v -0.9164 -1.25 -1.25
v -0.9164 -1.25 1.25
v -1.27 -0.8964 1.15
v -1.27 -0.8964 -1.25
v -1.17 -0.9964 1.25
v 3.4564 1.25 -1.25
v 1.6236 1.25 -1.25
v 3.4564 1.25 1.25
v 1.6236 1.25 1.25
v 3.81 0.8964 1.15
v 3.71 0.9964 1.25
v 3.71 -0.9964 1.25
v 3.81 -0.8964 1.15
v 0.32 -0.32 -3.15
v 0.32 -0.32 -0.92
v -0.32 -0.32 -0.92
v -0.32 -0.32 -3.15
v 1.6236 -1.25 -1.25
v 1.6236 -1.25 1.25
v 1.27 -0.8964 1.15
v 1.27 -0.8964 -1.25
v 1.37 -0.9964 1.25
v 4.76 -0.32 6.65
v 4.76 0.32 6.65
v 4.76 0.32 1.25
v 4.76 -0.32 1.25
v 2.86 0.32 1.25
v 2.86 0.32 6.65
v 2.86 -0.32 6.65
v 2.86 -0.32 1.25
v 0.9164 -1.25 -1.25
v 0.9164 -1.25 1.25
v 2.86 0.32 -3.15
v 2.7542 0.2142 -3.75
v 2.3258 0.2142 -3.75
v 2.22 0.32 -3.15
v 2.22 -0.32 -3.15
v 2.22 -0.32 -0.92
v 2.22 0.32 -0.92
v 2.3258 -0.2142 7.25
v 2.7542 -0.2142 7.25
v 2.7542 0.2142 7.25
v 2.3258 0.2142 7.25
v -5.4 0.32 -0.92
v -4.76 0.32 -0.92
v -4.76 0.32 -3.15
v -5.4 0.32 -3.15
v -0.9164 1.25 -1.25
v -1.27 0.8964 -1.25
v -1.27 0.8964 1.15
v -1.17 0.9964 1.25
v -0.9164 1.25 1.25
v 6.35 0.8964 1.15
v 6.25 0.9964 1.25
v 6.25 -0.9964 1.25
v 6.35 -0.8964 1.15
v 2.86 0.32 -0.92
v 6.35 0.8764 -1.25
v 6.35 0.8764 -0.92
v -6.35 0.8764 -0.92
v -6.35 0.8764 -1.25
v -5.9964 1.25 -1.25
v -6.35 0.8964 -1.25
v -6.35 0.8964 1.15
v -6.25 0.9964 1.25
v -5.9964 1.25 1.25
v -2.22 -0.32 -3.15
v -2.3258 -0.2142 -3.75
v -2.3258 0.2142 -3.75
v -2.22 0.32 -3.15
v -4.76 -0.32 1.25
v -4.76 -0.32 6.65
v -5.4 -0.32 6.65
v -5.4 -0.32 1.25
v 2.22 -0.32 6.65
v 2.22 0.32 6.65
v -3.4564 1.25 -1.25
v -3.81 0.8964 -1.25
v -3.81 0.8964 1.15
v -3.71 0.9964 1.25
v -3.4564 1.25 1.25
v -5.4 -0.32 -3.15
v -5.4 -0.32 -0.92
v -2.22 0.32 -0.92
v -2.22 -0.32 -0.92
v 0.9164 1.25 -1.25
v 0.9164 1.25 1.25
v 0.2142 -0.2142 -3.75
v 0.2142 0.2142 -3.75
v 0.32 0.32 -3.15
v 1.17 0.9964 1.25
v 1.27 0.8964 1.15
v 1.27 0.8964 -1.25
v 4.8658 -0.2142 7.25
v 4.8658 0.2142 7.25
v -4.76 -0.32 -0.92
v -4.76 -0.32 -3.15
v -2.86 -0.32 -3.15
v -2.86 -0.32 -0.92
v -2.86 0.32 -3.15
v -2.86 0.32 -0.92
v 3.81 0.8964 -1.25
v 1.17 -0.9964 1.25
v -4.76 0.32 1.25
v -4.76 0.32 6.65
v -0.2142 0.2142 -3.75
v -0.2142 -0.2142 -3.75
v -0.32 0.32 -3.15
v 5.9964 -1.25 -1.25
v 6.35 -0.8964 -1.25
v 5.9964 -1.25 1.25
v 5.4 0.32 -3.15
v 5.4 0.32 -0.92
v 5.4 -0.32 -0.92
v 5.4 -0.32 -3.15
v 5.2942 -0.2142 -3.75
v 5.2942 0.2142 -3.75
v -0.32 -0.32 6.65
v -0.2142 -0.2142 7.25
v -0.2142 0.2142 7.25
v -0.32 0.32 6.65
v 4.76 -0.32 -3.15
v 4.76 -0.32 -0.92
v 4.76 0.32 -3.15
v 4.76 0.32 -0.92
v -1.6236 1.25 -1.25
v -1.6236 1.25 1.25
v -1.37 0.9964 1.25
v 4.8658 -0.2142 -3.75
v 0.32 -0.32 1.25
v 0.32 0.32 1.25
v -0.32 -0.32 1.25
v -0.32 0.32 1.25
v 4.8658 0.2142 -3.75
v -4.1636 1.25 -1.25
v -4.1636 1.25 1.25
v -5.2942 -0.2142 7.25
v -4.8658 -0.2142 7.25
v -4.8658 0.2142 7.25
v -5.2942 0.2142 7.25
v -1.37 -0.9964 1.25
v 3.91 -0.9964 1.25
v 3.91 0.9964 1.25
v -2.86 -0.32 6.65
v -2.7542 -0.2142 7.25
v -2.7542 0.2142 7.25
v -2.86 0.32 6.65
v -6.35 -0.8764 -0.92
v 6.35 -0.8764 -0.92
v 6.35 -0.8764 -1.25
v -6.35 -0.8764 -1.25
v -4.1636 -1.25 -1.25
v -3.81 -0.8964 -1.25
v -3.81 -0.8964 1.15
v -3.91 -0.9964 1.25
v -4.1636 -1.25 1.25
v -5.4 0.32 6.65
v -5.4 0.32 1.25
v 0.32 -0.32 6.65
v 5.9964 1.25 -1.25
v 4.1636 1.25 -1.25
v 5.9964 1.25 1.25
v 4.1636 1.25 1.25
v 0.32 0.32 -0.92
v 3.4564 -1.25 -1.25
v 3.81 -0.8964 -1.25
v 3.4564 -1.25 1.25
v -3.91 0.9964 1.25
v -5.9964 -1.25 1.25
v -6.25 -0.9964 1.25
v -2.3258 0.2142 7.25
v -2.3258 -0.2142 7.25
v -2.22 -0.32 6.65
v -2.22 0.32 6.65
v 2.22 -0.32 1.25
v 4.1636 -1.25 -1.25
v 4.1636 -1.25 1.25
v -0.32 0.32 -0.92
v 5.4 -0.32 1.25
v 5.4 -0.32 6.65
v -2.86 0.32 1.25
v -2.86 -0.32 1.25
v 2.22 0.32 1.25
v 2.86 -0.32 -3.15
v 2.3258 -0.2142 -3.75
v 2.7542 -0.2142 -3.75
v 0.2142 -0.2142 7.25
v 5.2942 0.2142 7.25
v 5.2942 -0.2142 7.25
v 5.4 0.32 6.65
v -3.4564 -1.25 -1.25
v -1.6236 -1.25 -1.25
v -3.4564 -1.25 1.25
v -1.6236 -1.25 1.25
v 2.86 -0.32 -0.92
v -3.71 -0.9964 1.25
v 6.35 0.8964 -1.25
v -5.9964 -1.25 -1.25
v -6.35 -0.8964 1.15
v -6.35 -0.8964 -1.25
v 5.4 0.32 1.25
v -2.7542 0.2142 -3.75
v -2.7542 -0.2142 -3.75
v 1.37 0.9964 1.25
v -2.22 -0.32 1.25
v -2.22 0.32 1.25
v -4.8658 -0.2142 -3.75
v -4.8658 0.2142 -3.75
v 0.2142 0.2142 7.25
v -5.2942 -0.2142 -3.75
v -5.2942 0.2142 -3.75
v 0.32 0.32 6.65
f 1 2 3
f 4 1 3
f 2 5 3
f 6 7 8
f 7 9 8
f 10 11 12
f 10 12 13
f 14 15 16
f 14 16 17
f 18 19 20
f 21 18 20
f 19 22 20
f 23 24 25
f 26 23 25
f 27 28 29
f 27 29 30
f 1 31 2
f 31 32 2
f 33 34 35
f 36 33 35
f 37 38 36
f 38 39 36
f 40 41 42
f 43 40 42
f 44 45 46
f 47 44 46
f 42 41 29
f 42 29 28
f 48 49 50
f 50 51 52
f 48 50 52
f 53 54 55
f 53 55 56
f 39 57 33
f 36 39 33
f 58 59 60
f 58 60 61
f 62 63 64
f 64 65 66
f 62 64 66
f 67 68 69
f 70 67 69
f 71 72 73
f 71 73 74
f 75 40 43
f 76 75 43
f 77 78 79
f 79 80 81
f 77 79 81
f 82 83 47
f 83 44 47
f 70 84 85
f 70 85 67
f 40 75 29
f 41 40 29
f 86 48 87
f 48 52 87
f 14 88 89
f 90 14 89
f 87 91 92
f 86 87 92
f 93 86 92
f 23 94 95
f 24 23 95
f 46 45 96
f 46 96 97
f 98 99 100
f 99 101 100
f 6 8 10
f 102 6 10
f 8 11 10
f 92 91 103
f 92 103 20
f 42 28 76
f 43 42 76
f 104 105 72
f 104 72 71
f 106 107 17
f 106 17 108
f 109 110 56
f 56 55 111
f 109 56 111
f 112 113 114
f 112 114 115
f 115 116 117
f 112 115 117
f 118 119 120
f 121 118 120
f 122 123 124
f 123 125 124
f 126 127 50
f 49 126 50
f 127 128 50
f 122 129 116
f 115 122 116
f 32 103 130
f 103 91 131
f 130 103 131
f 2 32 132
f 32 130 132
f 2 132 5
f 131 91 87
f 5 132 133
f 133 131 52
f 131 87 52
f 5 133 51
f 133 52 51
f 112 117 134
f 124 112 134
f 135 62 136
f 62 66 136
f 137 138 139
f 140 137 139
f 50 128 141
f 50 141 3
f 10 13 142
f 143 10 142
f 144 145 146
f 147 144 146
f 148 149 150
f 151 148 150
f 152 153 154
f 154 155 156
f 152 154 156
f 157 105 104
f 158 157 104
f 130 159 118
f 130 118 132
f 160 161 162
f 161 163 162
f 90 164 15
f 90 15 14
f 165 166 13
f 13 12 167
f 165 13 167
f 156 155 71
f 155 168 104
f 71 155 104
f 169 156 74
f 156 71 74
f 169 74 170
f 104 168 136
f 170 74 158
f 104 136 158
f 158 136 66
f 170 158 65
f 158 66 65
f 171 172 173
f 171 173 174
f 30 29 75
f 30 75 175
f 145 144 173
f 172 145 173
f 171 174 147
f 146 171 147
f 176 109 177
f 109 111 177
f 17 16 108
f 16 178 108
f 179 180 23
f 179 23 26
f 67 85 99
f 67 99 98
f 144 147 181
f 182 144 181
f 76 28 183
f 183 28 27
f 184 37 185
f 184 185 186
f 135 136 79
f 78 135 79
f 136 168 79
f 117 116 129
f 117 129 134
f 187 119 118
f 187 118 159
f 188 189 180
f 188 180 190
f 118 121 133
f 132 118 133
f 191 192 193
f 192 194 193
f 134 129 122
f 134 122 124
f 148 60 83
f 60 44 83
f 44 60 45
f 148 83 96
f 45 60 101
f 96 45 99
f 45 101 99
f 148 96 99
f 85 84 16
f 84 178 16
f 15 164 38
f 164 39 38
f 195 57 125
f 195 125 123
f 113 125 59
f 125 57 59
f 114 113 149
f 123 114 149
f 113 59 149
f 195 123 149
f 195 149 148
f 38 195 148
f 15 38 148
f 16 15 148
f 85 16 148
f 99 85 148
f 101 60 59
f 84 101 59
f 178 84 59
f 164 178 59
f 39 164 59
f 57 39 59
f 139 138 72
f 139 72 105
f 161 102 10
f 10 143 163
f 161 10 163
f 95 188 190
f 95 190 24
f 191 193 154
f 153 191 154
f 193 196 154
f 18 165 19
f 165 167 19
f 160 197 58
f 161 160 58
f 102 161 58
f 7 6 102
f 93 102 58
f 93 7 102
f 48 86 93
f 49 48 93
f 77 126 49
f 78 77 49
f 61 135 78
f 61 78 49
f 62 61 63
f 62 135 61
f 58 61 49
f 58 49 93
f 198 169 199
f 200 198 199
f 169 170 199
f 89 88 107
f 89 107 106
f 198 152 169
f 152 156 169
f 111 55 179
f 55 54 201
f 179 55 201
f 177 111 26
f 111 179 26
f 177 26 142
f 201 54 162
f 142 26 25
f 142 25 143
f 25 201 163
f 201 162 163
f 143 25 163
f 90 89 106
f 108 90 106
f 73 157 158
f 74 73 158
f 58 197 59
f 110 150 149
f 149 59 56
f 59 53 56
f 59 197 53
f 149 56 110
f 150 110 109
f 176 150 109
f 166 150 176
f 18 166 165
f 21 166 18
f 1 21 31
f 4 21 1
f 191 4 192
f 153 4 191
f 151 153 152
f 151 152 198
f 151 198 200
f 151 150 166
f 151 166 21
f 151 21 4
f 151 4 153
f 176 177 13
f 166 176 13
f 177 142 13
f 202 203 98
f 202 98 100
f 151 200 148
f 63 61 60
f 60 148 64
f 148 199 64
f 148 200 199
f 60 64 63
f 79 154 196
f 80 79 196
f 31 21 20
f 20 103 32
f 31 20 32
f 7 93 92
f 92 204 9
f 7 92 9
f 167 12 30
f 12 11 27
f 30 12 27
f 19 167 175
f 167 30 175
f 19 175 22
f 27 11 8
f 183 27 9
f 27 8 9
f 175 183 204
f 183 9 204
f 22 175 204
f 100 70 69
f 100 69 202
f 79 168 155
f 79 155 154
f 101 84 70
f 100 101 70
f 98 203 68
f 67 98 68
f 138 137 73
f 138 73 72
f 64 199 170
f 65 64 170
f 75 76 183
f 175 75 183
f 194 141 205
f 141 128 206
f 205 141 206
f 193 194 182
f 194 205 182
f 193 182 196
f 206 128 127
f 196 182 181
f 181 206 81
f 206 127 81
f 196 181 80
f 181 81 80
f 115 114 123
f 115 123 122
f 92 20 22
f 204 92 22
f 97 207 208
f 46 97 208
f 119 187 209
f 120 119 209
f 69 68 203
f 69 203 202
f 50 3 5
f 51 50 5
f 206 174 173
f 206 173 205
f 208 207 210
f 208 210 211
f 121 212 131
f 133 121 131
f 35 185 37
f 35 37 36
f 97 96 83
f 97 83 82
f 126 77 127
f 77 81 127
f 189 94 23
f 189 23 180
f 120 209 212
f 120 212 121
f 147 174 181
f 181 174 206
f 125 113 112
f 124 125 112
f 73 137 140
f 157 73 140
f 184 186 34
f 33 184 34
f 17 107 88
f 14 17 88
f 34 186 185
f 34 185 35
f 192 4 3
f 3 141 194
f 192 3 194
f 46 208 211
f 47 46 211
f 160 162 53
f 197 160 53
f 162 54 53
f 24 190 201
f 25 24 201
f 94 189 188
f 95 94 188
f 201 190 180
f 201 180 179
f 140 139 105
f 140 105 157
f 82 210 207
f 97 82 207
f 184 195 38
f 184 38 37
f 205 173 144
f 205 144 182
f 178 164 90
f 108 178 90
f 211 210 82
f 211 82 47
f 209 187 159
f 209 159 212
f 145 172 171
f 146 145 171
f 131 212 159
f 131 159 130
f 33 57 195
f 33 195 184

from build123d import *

# Parameters (mm, degrees)
EXTRUDE1_DEPTH          = 1.25
CUT_EXTRUDE3_DEPTH      = 2.25
LPATTERN4_COUNT         = 3
LPATTERN4_PITCH         = 2.54
LPATTERN4_COUNT_DIR2    = 3
LPATTERN4_PITCH_DIR2    = 2.54
SKETCH2_W               = 1.752893218
SKETCH2_H               = 0.33
CUT_EXTRUDE1_DEPTH      = 7.35
CUT_EXTRUDE1_DEPTH_BACK = 7.35
SKETCH3_W               = 11
SKETCH3_H               = 0.64
EXTRUDE_THIN1_DEPTH     = 0.32
LPATTERN5_COUNT         = 3
LPATTERN5_PITCH         = 2.54
LPATTERN5_COL_COUNT     = 3
LPATTERN5_COL_PITCH     = 2.54
CHAMFER2_SIZE           = 0.6
CHAMFER2_SIZE2          = 0.105796188
CHAMFER2_PART_2_SIZE    = 0.6
CHAMFER2_PART_2_SIZE2   = 0.105796188
CHAMFER2_PART_3_SIZE    = 0.6
CHAMFER2_PART_3_SIZE2   = 0.105796188
CHAMFER2_PART_4_SIZE    = 0.6
CHAMFER2_PART_4_SIZE2   = 0.105796188
CHAMFER2_PART_5_SIZE    = 0.6
CHAMFER2_PART_5_SIZE2   = 0.105796188
CHAMFER2_PART_6_SIZE    = 0.6
CHAMFER2_PART_6_SIZE2   = 0.105796188
CHAMFER2_PART_7_SIZE    = 0.6
CHAMFER2_PART_7_SIZE2   = 0.105796188
CHAMFER2_PART_8_SIZE    = 0.6
CHAMFER2_PART_8_SIZE2   = 0.105796188
CHAMFER2_PART_9_SIZE    = 0.6
CHAMFER2_PART_9_SIZE2   = 0.105796188
CHAMFER2_PART_10_SIZE   = 0.6
CHAMFER2_PART_10_SIZE2  = 0.105796188
CHAMFER2_PART_11_SIZE   = 0.6
CHAMFER2_PART_11_SIZE2  = 0.105796188
CHAMFER2_PART_12_SIZE   = 0.6
CHAMFER2_PART_12_SIZE2  = 0.105796188
CHAMFER2_PART_13_SIZE   = 0.6
CHAMFER2_PART_13_SIZE2  = 0.105796188
CHAMFER2_PART_14_SIZE   = 0.6
CHAMFER2_PART_14_SIZE2  = 0.105796188
CHAMFER2_PART_15_SIZE   = 0.6
CHAMFER2_PART_15_SIZE2  = 0.105796188
CHAMFER2_PART_16_SIZE   = 0.6
CHAMFER2_PART_16_SIZE2  = 0.105796188
CHAMFER2_PART_17_SIZE   = 0.6
CHAMFER2_PART_17_SIZE2  = 0.105796188
CHAMFER2_PART_18_SIZE   = 0.6
CHAMFER2_PART_18_SIZE2  = 0.105796188
CHAMFER2_PART_19_SIZE   = 0.6
CHAMFER2_PART_19_SIZE2  = 0.105796188
CHAMFER2_PART_20_SIZE   = 0.6
CHAMFER2_PART_20_SIZE2  = 0.105796188
CHAMFER2_PART_21_SIZE   = 0.6
CHAMFER2_PART_21_SIZE2  = 0.105796188
CHAMFER2_PART_22_SIZE   = 0.6
CHAMFER2_PART_22_SIZE2  = 0.105796188
CHAMFER2_PART_23_SIZE   = 0.6
CHAMFER2_PART_23_SIZE2  = 0.105796188
CHAMFER2_PART_24_SIZE   = 0.6
CHAMFER2_PART_24_SIZE2  = 0.105796188
CHAMFER2_PART_25_SIZE   = 0.6
CHAMFER2_PART_25_SIZE2  = 0.105796188
CHAMFER2_PART_26_SIZE   = 0.6
CHAMFER2_PART_26_SIZE2  = 0.105796188
CHAMFER2_PART_27_SIZE   = 0.6
CHAMFER2_PART_27_SIZE2  = 0.105796188
CHAMFER2_PART_28_SIZE   = 0.6
CHAMFER2_PART_28_SIZE2  = 0.105796188
CHAMFER2_PART_29_SIZE   = 0.6
CHAMFER2_PART_29_SIZE2  = 0.105796188
CHAMFER2_PART_30_SIZE   = 0.6
CHAMFER2_PART_30_SIZE2  = 0.105796188
CHAMFER2_PART_31_SIZE   = 0.6
CHAMFER2_PART_31_SIZE2  = 0.105796188
CHAMFER2_PART_32_SIZE   = 0.6
CHAMFER2_PART_32_SIZE2  = 0.105796188
CHAMFER2_PART_33_SIZE   = 0.6
CHAMFER2_PART_33_SIZE2  = 0.105796188
CHAMFER2_PART_34_SIZE   = 0.6
CHAMFER2_PART_34_SIZE2  = 0.105796188
CHAMFER2_PART_35_SIZE   = 0.6
CHAMFER2_PART_35_SIZE2  = 0.105796188
CHAMFER2_PART_36_SIZE   = 0.6
CHAMFER2_PART_36_SIZE2  = 0.105796188
CHAMFER2_PART_37_SIZE   = 0.6
CHAMFER2_PART_37_SIZE2  = 0.105796188
CHAMFER2_PART_38_SIZE   = 0.6
CHAMFER2_PART_38_SIZE2  = 0.105796188
CHAMFER2_PART_39_SIZE   = 0.6
CHAMFER2_PART_39_SIZE2  = 0.105796188
CHAMFER2_PART_40_SIZE   = 0.6
CHAMFER2_PART_40_SIZE2  = 0.105796188


with BuildPart() as part:
    # Sketch1 → Extrude1 (new body, symmetric)
    with BuildSketch(Plane.XY):
        Polygon((-1.27, 0.896446609), (-0.916446609, 1.25), (0.916446609, 1.25), (1.27, 0.896446609), (1.27, -0.896446609), (0.916446609, -1.25), (-0.916446609, -1.25), (-1.27, -0.896446609), align=None)
    extrude1 = extrude(amount=EXTRUDE1_DEPTH, both=True)

    # Sketch4 → Cut-Extrude3 (cut, symmetric)
    with BuildSketch(Plane(origin=(0, 0, 0), x_dir=(1, 0, 0), z_dir=(0, 1, 0))):
        Polygon((-1.27, -1.15), (-1.17, -1.25), (-1.27, -1.25), align=None)
        Polygon((1.17, -1.25), (1.27, -1.15), (1.27, -1.25), align=None)
    cut_extrude3 = extrude(amount=CUT_EXTRUDE3_DEPTH, both=True, mode=Mode.SUBTRACT)

    # LPattern4: Extrude1, Cut-Extrude3 3 × 3
    with Locations(*[Vector(-1, 0, 0) * (i * LPATTERN4_PITCH) + Vector(1, 0, 0) * (j * LPATTERN4_PITCH_DIR2) for i in range(LPATTERN4_COUNT) for j in range(LPATTERN4_COUNT_DIR2) if (i, j) != (0, 0)]):
        add(extrude1)
        add(cut_extrude3, mode=Mode.SUBTRACT)

    # Sketch2 → Cut-Extrude1 (cut, two sides)
    with BuildSketch(Plane(origin=(0, 0, 0), x_dir=(0, -1, 0), z_dir=(1, 0, 0))) as cut_extrude1_sk:
        with Locations((0, 1.085)):
            Rectangle(SKETCH2_W, SKETCH2_H)
    extrude(amount=CUT_EXTRUDE1_DEPTH, mode=Mode.SUBTRACT)
    extrude(cut_extrude1_sk.sketch, amount=-CUT_EXTRUDE1_DEPTH_BACK, mode=Mode.SUBTRACT)

    # Sketch3 → Extrude-Thin1 (add, symmetric)
    with BuildSketch(Plane(origin=(0, 0, 0), x_dir=(0, 0, -1), z_dir=(1, 0, 0))):
        with Locations((-1.75, 0)):
            Rectangle(SKETCH3_W, SKETCH3_H)
    extrude_thin1 = extrude(amount=EXTRUDE_THIN1_DEPTH, both=True)

    # LPattern5: Extrude-Thin1 ×3
    with Locations(*[(i * LPATTERN5_PITCH, 0, 0) for i in range(1, LPATTERN5_COUNT)]):
        add(extrude_thin1)

    # LPattern5 col: Extrude-Thin1 ×3
    with Locations(*[(-i * LPATTERN5_COL_PITCH, 0, 0) for i in range(1, LPATTERN5_COL_COUNT)]):
        add(extrude_thin1)

    # Chamfer2
    chamfer2_edges = [part.edges().sort_by_distance(p)[0] for p in [
        (0, -0.32, 7.25),
    ]]
    chamfer2_side = [part.faces().sort_by_distance(p)[0] for p in [
        (0, -0.32, 4.25),
    ]]
    chamfer(chamfer2_edges, length=CHAMFER2_SIZE, length2=CHAMFER2_SIZE2, reference=chamfer2_side[0])

    # Chamfer2 part 2
    chamfer2_part_2_edges = [part.edges().sort_by_distance(p)[0] for p in [
        (0, 0.32, -3.75),
    ]]
    chamfer2_part_2_side = [part.faces().sort_by_distance(p)[0] for p in [
        (0, 0.32, -2.335),
    ]]
    chamfer(chamfer2_part_2_edges, length=CHAMFER2_PART_2_SIZE, length2=CHAMFER2_PART_2_SIZE2, reference=chamfer2_part_2_side[0])

    # Chamfer2 part 3
    chamfer2_part_3_edges = [part.edges().sort_by_distance(p)[0] for p in [
        (-0.32, 0, 7.25),
    ]]
    chamfer2_part_3_side = [part.faces().sort_by_distance(p)[0] for p in [
        (-0.32, 0, 4.25),
    ]]
    chamfer(chamfer2_part_3_edges, length=CHAMFER2_PART_3_SIZE, length2=CHAMFER2_PART_3_SIZE2, reference=chamfer2_part_3_side[0])

    # Chamfer2 part 4
    chamfer2_part_4_edges = [part.edges().sort_by_distance(p)[0] for p in [
        (-0.32, 0, -3.75),
    ]]
    chamfer2_part_4_side = [part.faces().sort_by_distance(p)[0] for p in [
        (-0.32, 0, -2.335),
    ]]
    chamfer(chamfer2_part_4_edges, length=CHAMFER2_PART_4_SIZE, length2=CHAMFER2_PART_4_SIZE2, reference=chamfer2_part_4_side[0])

    # Chamfer2 part 5
    chamfer2_part_5_edges = [part.edges().sort_by_distance(p)[0] for p in [
        (0, -0.32, -3.75),
    ]]
    chamfer2_part_5_side = [part.faces().sort_by_distance(p)[0] for p in [
        (0, -0.32, -2.335),
    ]]
    chamfer(chamfer2_part_5_edges, length=CHAMFER2_PART_5_SIZE, length2=CHAMFER2_PART_5_SIZE2, reference=chamfer2_part_5_side[0])

    # Chamfer2 part 6
    chamfer2_part_6_edges = [part.edges().sort_by_distance(p)[0] for p in [
        (0.32, 0, -3.75),
    ]]
    chamfer2_part_6_side = [part.faces().sort_by_distance(p)[0] for p in [
        (0.32, 0, -2.335),
    ]]
    chamfer(chamfer2_part_6_edges, length=CHAMFER2_PART_6_SIZE, length2=CHAMFER2_PART_6_SIZE2, reference=chamfer2_part_6_side[0])

    # Chamfer2 part 7
    chamfer2_part_7_edges = [part.edges().sort_by_distance(p)[0] for p in [
        (0, 0.32, 7.25),
    ]]
    chamfer2_part_7_side = [part.faces().sort_by_distance(p)[0] for p in [
        (0, 0.32, 4.25),
    ]]
    chamfer(chamfer2_part_7_edges, length=CHAMFER2_PART_7_SIZE, length2=CHAMFER2_PART_7_SIZE2, reference=chamfer2_part_7_side[0])

    # Chamfer2 part 8
    chamfer2_part_8_edges = [part.edges().sort_by_distance(p)[0] for p in [
        (0.32, 0, 7.25),
    ]]
    chamfer2_part_8_side = [part.faces().sort_by_distance(p)[0] for p in [
        (0.32, 0, 4.25),
    ]]
    chamfer(chamfer2_part_8_edges, length=CHAMFER2_PART_8_SIZE, length2=CHAMFER2_PART_8_SIZE2, reference=chamfer2_part_8_side[0])

    # Chamfer2 part 9
    chamfer2_part_9_edges = [part.edges().sort_by_distance(p)[0] for p in [
        (-2.54, -0.32, 7.25),
    ]]
    chamfer2_part_9_side = [part.faces().sort_by_distance(p)[0] for p in [
        (-2.54, -0.32, 4.25),
    ]]
    chamfer(chamfer2_part_9_edges, length=CHAMFER2_PART_9_SIZE, length2=CHAMFER2_PART_9_SIZE2, reference=chamfer2_part_9_side[0])

    # Chamfer2 part 10
    chamfer2_part_10_edges = [part.edges().sort_by_distance(p)[0] for p in [
        (-2.54, 0.32, -3.75),
    ]]
    chamfer2_part_10_side = [part.faces().sort_by_distance(p)[0] for p in [
        (-2.54, 0.32, -2.335),
    ]]
    chamfer(chamfer2_part_10_edges, length=CHAMFER2_PART_10_SIZE, length2=CHAMFER2_PART_10_SIZE2, reference=chamfer2_part_10_side[0])

    # Chamfer2 part 11
    chamfer2_part_11_edges = [part.edges().sort_by_distance(p)[0] for p in [
        (-2.86, 0, -3.75),
    ]]
    chamfer2_part_11_side = [part.faces().sort_by_distance(p)[0] for p in [
        (-2.86, 0, -2.335),
    ]]
    chamfer(chamfer2_part_11_edges, length=CHAMFER2_PART_11_SIZE, length2=CHAMFER2_PART_11_SIZE2, reference=chamfer2_part_11_side[0])

    # Chamfer2 part 12
    chamfer2_part_12_edges = [part.edges().sort_by_distance(p)[0] for p in [
        (-2.86, 0, 7.25),
    ]]
    chamfer2_part_12_side = [part.faces().sort_by_distance(p)[0] for p in [
        (-2.86, 0, 4.25),
    ]]
    chamfer(chamfer2_part_12_edges, length=CHAMFER2_PART_12_SIZE, length2=CHAMFER2_PART_12_SIZE2, reference=chamfer2_part_12_side[0])

    # Chamfer2 part 13
    chamfer2_part_13_edges = [part.edges().sort_by_distance(p)[0] for p in [
        (-2.54, -0.32, -3.75),
    ]]
    chamfer2_part_13_side = [part.faces().sort_by_distance(p)[0] for p in [
        (-2.54, -0.32, -2.335),
    ]]
    chamfer(chamfer2_part_13_edges, length=CHAMFER2_PART_13_SIZE, length2=CHAMFER2_PART_13_SIZE2, reference=chamfer2_part_13_side[0])

    # Chamfer2 part 14
    chamfer2_part_14_edges = [part.edges().sort_by_distance(p)[0] for p in [
        (-2.22, 0, -3.75),
    ]]
    chamfer2_part_14_side = [part.faces().sort_by_distance(p)[0] for p in [
        (-2.22, 0, -2.335),
    ]]
    chamfer(chamfer2_part_14_edges, length=CHAMFER2_PART_14_SIZE, length2=CHAMFER2_PART_14_SIZE2, reference=chamfer2_part_14_side[0])

    # Chamfer2 part 15
    chamfer2_part_15_edges = [part.edges().sort_by_distance(p)[0] for p in [
        (-2.54, 0.32, 7.25),
    ]]
    chamfer2_part_15_side = [part.faces().sort_by_distance(p)[0] for p in [
        (-2.54, 0.32, 4.25),
    ]]
    chamfer(chamfer2_part_15_edges, length=CHAMFER2_PART_15_SIZE, length2=CHAMFER2_PART_15_SIZE2, reference=chamfer2_part_15_side[0])

    # Chamfer2 part 16
    chamfer2_part_16_edges = [part.edges().sort_by_distance(p)[0] for p in [
        (-2.22, 0, 7.25),
    ]]
    chamfer2_part_16_side = [part.faces().sort_by_distance(p)[0] for p in [
        (-2.22, 0, 4.25),
    ]]
    chamfer(chamfer2_part_16_edges, length=CHAMFER2_PART_16_SIZE, length2=CHAMFER2_PART_16_SIZE2, reference=chamfer2_part_16_side[0])

    # Chamfer2 part 17
    chamfer2_part_17_edges = [part.edges().sort_by_distance(p)[0] for p in [
        (-5.08, -0.32, 7.25),
    ]]
    chamfer2_part_17_side = [part.faces().sort_by_distance(p)[0] for p in [
        (-5.08, -0.32, 4.25),
    ]]
    chamfer(chamfer2_part_17_edges, length=CHAMFER2_PART_17_SIZE, length2=CHAMFER2_PART_17_SIZE2, reference=chamfer2_part_17_side[0])

    # Chamfer2 part 18
    chamfer2_part_18_edges = [part.edges().sort_by_distance(p)[0] for p in [
        (-5.08, 0.32, -3.75),
    ]]
    chamfer2_part_18_side = [part.faces().sort_by_distance(p)[0] for p in [
        (-5.08, 0.32, -2.335),
    ]]
    chamfer(chamfer2_part_18_edges, length=CHAMFER2_PART_18_SIZE, length2=CHAMFER2_PART_18_SIZE2, reference=chamfer2_part_18_side[0])

    # Chamfer2 part 19
    chamfer2_part_19_edges = [part.edges().sort_by_distance(p)[0] for p in [
        (-5.4, 0, -3.75),
    ]]
    chamfer2_part_19_side = [part.faces().sort_by_distance(p)[0] for p in [
        (-5.4, 0, -2.335),
    ]]
    chamfer(chamfer2_part_19_edges, length=CHAMFER2_PART_19_SIZE, length2=CHAMFER2_PART_19_SIZE2, reference=chamfer2_part_19_side[0])

    # Chamfer2 part 20
    chamfer2_part_20_edges = [part.edges().sort_by_distance(p)[0] for p in [
        (-5.4, 0, 7.25),
    ]]
    chamfer2_part_20_side = [part.faces().sort_by_distance(p)[0] for p in [
        (-5.4, 0, 4.25),
    ]]
    chamfer(chamfer2_part_20_edges, length=CHAMFER2_PART_20_SIZE, length2=CHAMFER2_PART_20_SIZE2, reference=chamfer2_part_20_side[0])

    # Chamfer2 part 21
    chamfer2_part_21_edges = [part.edges().sort_by_distance(p)[0] for p in [
        (-5.08, -0.32, -3.75),
    ]]
    chamfer2_part_21_side = [part.faces().sort_by_distance(p)[0] for p in [
        (-5.08, -0.32, -2.335),
    ]]
    chamfer(chamfer2_part_21_edges, length=CHAMFER2_PART_21_SIZE, length2=CHAMFER2_PART_21_SIZE2, reference=chamfer2_part_21_side[0])

    # Chamfer2 part 22
    chamfer2_part_22_edges = [part.edges().sort_by_distance(p)[0] for p in [
        (-4.76, 0, -3.75),
    ]]
    chamfer2_part_22_side = [part.faces().sort_by_distance(p)[0] for p in [
        (-4.76, 0, -2.335),
    ]]
    chamfer(chamfer2_part_22_edges, length=CHAMFER2_PART_22_SIZE, length2=CHAMFER2_PART_22_SIZE2, reference=chamfer2_part_22_side[0])

    # Chamfer2 part 23
    chamfer2_part_23_edges = [part.edges().sort_by_distance(p)[0] for p in [
        (-5.08, 0.32, 7.25),
    ]]
    chamfer2_part_23_side = [part.faces().sort_by_distance(p)[0] for p in [
        (-5.08, 0.32, 4.25),
    ]]
    chamfer(chamfer2_part_23_edges, length=CHAMFER2_PART_23_SIZE, length2=CHAMFER2_PART_23_SIZE2, reference=chamfer2_part_23_side[0])

    # Chamfer2 part 24
    chamfer2_part_24_edges = [part.edges().sort_by_distance(p)[0] for p in [
        (-4.76, 0, 7.25),
    ]]
    chamfer2_part_24_side = [part.faces().sort_by_distance(p)[0] for p in [
        (-4.76, 0, 4.25),
    ]]
    chamfer(chamfer2_part_24_edges, length=CHAMFER2_PART_24_SIZE, length2=CHAMFER2_PART_24_SIZE2, reference=chamfer2_part_24_side[0])

    # Chamfer2 part 25
    chamfer2_part_25_edges = [part.edges().sort_by_distance(p)[0] for p in [
        (2.54, -0.32, 7.25),
    ]]
    chamfer2_part_25_side = [part.faces().sort_by_distance(p)[0] for p in [
        (2.54, -0.32, 4.25),
    ]]
    chamfer(chamfer2_part_25_edges, length=CHAMFER2_PART_25_SIZE, length2=CHAMFER2_PART_25_SIZE2, reference=chamfer2_part_25_side[0])

    # Chamfer2 part 26
    chamfer2_part_26_edges = [part.edges().sort_by_distance(p)[0] for p in [
        (2.54, 0.32, -3.75),
    ]]
    chamfer2_part_26_side = [part.faces().sort_by_distance(p)[0] for p in [
        (2.54, 0.32, -2.335),
    ]]
    chamfer(chamfer2_part_26_edges, length=CHAMFER2_PART_26_SIZE, length2=CHAMFER2_PART_26_SIZE2, reference=chamfer2_part_26_side[0])

    # Chamfer2 part 27
    chamfer2_part_27_edges = [part.edges().sort_by_distance(p)[0] for p in [
        (2.22, 0, -3.75),
    ]]
    chamfer2_part_27_side = [part.faces().sort_by_distance(p)[0] for p in [
        (2.22, 0, -2.335),
    ]]
    chamfer(chamfer2_part_27_edges, length=CHAMFER2_PART_27_SIZE, length2=CHAMFER2_PART_27_SIZE2, reference=chamfer2_part_27_side[0])

    # Chamfer2 part 28
    chamfer2_part_28_edges = [part.edges().sort_by_distance(p)[0] for p in [
        (2.22, 0, 7.25),
    ]]
    chamfer2_part_28_side = [part.faces().sort_by_distance(p)[0] for p in [
        (2.22, 0, 4.25),
    ]]
    chamfer(chamfer2_part_28_edges, length=CHAMFER2_PART_28_SIZE, length2=CHAMFER2_PART_28_SIZE2, reference=chamfer2_part_28_side[0])

    # Chamfer2 part 29
    chamfer2_part_29_edges = [part.edges().sort_by_distance(p)[0] for p in [
        (2.54, -0.32, -3.75),
    ]]
    chamfer2_part_29_side = [part.faces().sort_by_distance(p)[0] for p in [
        (2.54, -0.32, -2.335),
    ]]
    chamfer(chamfer2_part_29_edges, length=CHAMFER2_PART_29_SIZE, length2=CHAMFER2_PART_29_SIZE2, reference=chamfer2_part_29_side[0])

    # Chamfer2 part 30
    chamfer2_part_30_edges = [part.edges().sort_by_distance(p)[0] for p in [
        (2.86, 0, -3.75),
    ]]
    chamfer2_part_30_side = [part.faces().sort_by_distance(p)[0] for p in [
        (2.86, 0, -2.335),
    ]]
    chamfer(chamfer2_part_30_edges, length=CHAMFER2_PART_30_SIZE, length2=CHAMFER2_PART_30_SIZE2, reference=chamfer2_part_30_side[0])

    # Chamfer2 part 31
    chamfer2_part_31_edges = [part.edges().sort_by_distance(p)[0] for p in [
        (2.54, 0.32, 7.25),
    ]]
    chamfer2_part_31_side = [part.faces().sort_by_distance(p)[0] for p in [
        (2.54, 0.32, 4.25),
    ]]
    chamfer(chamfer2_part_31_edges, length=CHAMFER2_PART_31_SIZE, length2=CHAMFER2_PART_31_SIZE2, reference=chamfer2_part_31_side[0])

    # Chamfer2 part 32
    chamfer2_part_32_edges = [part.edges().sort_by_distance(p)[0] for p in [
        (2.86, 0, 7.25),
    ]]
    chamfer2_part_32_side = [part.faces().sort_by_distance(p)[0] for p in [
        (2.86, 0, 4.25),
    ]]
    chamfer(chamfer2_part_32_edges, length=CHAMFER2_PART_32_SIZE, length2=CHAMFER2_PART_32_SIZE2, reference=chamfer2_part_32_side[0])

    # Chamfer2 part 33
    chamfer2_part_33_edges = [part.edges().sort_by_distance(p)[0] for p in [
        (5.08, -0.32, 7.25),
    ]]
    chamfer2_part_33_side = [part.faces().sort_by_distance(p)[0] for p in [
        (5.08, -0.32, 4.25),
    ]]
    chamfer(chamfer2_part_33_edges, length=CHAMFER2_PART_33_SIZE, length2=CHAMFER2_PART_33_SIZE2, reference=chamfer2_part_33_side[0])

    # Chamfer2 part 34
    chamfer2_part_34_edges = [part.edges().sort_by_distance(p)[0] for p in [
        (5.08, 0.32, -3.75),
    ]]
    chamfer2_part_34_side = [part.faces().sort_by_distance(p)[0] for p in [
        (5.08, 0.32, -2.335),
    ]]
    chamfer(chamfer2_part_34_edges, length=CHAMFER2_PART_34_SIZE, length2=CHAMFER2_PART_34_SIZE2, reference=chamfer2_part_34_side[0])

    # Chamfer2 part 35
    chamfer2_part_35_edges = [part.edges().sort_by_distance(p)[0] for p in [
        (4.76, 0, -3.75),
    ]]
    chamfer2_part_35_side = [part.faces().sort_by_distance(p)[0] for p in [
        (4.76, 0, -2.335),
    ]]
    chamfer(chamfer2_part_35_edges, length=CHAMFER2_PART_35_SIZE, length2=CHAMFER2_PART_35_SIZE2, reference=chamfer2_part_35_side[0])

    # Chamfer2 part 36
    chamfer2_part_36_edges = [part.edges().sort_by_distance(p)[0] for p in [
        (4.76, 0, 7.25),
    ]]
    chamfer2_part_36_side = [part.faces().sort_by_distance(p)[0] for p in [
        (4.76, 0, 4.25),
    ]]
    chamfer(chamfer2_part_36_edges, length=CHAMFER2_PART_36_SIZE, length2=CHAMFER2_PART_36_SIZE2, reference=chamfer2_part_36_side[0])

    # Chamfer2 part 37
    chamfer2_part_37_edges = [part.edges().sort_by_distance(p)[0] for p in [
        (5.08, -0.32, -3.75),
    ]]
    chamfer2_part_37_side = [part.faces().sort_by_distance(p)[0] for p in [
        (5.08, -0.32, -2.335),
    ]]
    chamfer(chamfer2_part_37_edges, length=CHAMFER2_PART_37_SIZE, length2=CHAMFER2_PART_37_SIZE2, reference=chamfer2_part_37_side[0])

    # Chamfer2 part 38
    chamfer2_part_38_edges = [part.edges().sort_by_distance(p)[0] for p in [
        (5.4, 0, -3.75),
    ]]
    chamfer2_part_38_side = [part.faces().sort_by_distance(p)[0] for p in [
        (5.4, 0, -2.335),
    ]]
    chamfer(chamfer2_part_38_edges, length=CHAMFER2_PART_38_SIZE, length2=CHAMFER2_PART_38_SIZE2, reference=chamfer2_part_38_side[0])

    # Chamfer2 part 39
    chamfer2_part_39_edges = [part.edges().sort_by_distance(p)[0] for p in [
        (5.08, 0.32, 7.25),
    ]]
    chamfer2_part_39_side = [part.faces().sort_by_distance(p)[0] for p in [
        (5.08, 0.32, 4.25),
    ]]
    chamfer(chamfer2_part_39_edges, length=CHAMFER2_PART_39_SIZE, length2=CHAMFER2_PART_39_SIZE2, reference=chamfer2_part_39_side[0])

    # Chamfer2 part 40
    chamfer2_part_40_edges = [part.edges().sort_by_distance(p)[0] for p in [
        (5.4, 0, 7.25),
    ]]
    chamfer2_part_40_side = [part.faces().sort_by_distance(p)[0] for p in [
        (5.4, 0, 4.25),
    ]]
    chamfer(chamfer2_part_40_edges, length=CHAMFER2_PART_40_SIZE, length2=CHAMFER2_PART_40_SIZE2, reference=chamfer2_part_40_side[0])


solid = part.part
